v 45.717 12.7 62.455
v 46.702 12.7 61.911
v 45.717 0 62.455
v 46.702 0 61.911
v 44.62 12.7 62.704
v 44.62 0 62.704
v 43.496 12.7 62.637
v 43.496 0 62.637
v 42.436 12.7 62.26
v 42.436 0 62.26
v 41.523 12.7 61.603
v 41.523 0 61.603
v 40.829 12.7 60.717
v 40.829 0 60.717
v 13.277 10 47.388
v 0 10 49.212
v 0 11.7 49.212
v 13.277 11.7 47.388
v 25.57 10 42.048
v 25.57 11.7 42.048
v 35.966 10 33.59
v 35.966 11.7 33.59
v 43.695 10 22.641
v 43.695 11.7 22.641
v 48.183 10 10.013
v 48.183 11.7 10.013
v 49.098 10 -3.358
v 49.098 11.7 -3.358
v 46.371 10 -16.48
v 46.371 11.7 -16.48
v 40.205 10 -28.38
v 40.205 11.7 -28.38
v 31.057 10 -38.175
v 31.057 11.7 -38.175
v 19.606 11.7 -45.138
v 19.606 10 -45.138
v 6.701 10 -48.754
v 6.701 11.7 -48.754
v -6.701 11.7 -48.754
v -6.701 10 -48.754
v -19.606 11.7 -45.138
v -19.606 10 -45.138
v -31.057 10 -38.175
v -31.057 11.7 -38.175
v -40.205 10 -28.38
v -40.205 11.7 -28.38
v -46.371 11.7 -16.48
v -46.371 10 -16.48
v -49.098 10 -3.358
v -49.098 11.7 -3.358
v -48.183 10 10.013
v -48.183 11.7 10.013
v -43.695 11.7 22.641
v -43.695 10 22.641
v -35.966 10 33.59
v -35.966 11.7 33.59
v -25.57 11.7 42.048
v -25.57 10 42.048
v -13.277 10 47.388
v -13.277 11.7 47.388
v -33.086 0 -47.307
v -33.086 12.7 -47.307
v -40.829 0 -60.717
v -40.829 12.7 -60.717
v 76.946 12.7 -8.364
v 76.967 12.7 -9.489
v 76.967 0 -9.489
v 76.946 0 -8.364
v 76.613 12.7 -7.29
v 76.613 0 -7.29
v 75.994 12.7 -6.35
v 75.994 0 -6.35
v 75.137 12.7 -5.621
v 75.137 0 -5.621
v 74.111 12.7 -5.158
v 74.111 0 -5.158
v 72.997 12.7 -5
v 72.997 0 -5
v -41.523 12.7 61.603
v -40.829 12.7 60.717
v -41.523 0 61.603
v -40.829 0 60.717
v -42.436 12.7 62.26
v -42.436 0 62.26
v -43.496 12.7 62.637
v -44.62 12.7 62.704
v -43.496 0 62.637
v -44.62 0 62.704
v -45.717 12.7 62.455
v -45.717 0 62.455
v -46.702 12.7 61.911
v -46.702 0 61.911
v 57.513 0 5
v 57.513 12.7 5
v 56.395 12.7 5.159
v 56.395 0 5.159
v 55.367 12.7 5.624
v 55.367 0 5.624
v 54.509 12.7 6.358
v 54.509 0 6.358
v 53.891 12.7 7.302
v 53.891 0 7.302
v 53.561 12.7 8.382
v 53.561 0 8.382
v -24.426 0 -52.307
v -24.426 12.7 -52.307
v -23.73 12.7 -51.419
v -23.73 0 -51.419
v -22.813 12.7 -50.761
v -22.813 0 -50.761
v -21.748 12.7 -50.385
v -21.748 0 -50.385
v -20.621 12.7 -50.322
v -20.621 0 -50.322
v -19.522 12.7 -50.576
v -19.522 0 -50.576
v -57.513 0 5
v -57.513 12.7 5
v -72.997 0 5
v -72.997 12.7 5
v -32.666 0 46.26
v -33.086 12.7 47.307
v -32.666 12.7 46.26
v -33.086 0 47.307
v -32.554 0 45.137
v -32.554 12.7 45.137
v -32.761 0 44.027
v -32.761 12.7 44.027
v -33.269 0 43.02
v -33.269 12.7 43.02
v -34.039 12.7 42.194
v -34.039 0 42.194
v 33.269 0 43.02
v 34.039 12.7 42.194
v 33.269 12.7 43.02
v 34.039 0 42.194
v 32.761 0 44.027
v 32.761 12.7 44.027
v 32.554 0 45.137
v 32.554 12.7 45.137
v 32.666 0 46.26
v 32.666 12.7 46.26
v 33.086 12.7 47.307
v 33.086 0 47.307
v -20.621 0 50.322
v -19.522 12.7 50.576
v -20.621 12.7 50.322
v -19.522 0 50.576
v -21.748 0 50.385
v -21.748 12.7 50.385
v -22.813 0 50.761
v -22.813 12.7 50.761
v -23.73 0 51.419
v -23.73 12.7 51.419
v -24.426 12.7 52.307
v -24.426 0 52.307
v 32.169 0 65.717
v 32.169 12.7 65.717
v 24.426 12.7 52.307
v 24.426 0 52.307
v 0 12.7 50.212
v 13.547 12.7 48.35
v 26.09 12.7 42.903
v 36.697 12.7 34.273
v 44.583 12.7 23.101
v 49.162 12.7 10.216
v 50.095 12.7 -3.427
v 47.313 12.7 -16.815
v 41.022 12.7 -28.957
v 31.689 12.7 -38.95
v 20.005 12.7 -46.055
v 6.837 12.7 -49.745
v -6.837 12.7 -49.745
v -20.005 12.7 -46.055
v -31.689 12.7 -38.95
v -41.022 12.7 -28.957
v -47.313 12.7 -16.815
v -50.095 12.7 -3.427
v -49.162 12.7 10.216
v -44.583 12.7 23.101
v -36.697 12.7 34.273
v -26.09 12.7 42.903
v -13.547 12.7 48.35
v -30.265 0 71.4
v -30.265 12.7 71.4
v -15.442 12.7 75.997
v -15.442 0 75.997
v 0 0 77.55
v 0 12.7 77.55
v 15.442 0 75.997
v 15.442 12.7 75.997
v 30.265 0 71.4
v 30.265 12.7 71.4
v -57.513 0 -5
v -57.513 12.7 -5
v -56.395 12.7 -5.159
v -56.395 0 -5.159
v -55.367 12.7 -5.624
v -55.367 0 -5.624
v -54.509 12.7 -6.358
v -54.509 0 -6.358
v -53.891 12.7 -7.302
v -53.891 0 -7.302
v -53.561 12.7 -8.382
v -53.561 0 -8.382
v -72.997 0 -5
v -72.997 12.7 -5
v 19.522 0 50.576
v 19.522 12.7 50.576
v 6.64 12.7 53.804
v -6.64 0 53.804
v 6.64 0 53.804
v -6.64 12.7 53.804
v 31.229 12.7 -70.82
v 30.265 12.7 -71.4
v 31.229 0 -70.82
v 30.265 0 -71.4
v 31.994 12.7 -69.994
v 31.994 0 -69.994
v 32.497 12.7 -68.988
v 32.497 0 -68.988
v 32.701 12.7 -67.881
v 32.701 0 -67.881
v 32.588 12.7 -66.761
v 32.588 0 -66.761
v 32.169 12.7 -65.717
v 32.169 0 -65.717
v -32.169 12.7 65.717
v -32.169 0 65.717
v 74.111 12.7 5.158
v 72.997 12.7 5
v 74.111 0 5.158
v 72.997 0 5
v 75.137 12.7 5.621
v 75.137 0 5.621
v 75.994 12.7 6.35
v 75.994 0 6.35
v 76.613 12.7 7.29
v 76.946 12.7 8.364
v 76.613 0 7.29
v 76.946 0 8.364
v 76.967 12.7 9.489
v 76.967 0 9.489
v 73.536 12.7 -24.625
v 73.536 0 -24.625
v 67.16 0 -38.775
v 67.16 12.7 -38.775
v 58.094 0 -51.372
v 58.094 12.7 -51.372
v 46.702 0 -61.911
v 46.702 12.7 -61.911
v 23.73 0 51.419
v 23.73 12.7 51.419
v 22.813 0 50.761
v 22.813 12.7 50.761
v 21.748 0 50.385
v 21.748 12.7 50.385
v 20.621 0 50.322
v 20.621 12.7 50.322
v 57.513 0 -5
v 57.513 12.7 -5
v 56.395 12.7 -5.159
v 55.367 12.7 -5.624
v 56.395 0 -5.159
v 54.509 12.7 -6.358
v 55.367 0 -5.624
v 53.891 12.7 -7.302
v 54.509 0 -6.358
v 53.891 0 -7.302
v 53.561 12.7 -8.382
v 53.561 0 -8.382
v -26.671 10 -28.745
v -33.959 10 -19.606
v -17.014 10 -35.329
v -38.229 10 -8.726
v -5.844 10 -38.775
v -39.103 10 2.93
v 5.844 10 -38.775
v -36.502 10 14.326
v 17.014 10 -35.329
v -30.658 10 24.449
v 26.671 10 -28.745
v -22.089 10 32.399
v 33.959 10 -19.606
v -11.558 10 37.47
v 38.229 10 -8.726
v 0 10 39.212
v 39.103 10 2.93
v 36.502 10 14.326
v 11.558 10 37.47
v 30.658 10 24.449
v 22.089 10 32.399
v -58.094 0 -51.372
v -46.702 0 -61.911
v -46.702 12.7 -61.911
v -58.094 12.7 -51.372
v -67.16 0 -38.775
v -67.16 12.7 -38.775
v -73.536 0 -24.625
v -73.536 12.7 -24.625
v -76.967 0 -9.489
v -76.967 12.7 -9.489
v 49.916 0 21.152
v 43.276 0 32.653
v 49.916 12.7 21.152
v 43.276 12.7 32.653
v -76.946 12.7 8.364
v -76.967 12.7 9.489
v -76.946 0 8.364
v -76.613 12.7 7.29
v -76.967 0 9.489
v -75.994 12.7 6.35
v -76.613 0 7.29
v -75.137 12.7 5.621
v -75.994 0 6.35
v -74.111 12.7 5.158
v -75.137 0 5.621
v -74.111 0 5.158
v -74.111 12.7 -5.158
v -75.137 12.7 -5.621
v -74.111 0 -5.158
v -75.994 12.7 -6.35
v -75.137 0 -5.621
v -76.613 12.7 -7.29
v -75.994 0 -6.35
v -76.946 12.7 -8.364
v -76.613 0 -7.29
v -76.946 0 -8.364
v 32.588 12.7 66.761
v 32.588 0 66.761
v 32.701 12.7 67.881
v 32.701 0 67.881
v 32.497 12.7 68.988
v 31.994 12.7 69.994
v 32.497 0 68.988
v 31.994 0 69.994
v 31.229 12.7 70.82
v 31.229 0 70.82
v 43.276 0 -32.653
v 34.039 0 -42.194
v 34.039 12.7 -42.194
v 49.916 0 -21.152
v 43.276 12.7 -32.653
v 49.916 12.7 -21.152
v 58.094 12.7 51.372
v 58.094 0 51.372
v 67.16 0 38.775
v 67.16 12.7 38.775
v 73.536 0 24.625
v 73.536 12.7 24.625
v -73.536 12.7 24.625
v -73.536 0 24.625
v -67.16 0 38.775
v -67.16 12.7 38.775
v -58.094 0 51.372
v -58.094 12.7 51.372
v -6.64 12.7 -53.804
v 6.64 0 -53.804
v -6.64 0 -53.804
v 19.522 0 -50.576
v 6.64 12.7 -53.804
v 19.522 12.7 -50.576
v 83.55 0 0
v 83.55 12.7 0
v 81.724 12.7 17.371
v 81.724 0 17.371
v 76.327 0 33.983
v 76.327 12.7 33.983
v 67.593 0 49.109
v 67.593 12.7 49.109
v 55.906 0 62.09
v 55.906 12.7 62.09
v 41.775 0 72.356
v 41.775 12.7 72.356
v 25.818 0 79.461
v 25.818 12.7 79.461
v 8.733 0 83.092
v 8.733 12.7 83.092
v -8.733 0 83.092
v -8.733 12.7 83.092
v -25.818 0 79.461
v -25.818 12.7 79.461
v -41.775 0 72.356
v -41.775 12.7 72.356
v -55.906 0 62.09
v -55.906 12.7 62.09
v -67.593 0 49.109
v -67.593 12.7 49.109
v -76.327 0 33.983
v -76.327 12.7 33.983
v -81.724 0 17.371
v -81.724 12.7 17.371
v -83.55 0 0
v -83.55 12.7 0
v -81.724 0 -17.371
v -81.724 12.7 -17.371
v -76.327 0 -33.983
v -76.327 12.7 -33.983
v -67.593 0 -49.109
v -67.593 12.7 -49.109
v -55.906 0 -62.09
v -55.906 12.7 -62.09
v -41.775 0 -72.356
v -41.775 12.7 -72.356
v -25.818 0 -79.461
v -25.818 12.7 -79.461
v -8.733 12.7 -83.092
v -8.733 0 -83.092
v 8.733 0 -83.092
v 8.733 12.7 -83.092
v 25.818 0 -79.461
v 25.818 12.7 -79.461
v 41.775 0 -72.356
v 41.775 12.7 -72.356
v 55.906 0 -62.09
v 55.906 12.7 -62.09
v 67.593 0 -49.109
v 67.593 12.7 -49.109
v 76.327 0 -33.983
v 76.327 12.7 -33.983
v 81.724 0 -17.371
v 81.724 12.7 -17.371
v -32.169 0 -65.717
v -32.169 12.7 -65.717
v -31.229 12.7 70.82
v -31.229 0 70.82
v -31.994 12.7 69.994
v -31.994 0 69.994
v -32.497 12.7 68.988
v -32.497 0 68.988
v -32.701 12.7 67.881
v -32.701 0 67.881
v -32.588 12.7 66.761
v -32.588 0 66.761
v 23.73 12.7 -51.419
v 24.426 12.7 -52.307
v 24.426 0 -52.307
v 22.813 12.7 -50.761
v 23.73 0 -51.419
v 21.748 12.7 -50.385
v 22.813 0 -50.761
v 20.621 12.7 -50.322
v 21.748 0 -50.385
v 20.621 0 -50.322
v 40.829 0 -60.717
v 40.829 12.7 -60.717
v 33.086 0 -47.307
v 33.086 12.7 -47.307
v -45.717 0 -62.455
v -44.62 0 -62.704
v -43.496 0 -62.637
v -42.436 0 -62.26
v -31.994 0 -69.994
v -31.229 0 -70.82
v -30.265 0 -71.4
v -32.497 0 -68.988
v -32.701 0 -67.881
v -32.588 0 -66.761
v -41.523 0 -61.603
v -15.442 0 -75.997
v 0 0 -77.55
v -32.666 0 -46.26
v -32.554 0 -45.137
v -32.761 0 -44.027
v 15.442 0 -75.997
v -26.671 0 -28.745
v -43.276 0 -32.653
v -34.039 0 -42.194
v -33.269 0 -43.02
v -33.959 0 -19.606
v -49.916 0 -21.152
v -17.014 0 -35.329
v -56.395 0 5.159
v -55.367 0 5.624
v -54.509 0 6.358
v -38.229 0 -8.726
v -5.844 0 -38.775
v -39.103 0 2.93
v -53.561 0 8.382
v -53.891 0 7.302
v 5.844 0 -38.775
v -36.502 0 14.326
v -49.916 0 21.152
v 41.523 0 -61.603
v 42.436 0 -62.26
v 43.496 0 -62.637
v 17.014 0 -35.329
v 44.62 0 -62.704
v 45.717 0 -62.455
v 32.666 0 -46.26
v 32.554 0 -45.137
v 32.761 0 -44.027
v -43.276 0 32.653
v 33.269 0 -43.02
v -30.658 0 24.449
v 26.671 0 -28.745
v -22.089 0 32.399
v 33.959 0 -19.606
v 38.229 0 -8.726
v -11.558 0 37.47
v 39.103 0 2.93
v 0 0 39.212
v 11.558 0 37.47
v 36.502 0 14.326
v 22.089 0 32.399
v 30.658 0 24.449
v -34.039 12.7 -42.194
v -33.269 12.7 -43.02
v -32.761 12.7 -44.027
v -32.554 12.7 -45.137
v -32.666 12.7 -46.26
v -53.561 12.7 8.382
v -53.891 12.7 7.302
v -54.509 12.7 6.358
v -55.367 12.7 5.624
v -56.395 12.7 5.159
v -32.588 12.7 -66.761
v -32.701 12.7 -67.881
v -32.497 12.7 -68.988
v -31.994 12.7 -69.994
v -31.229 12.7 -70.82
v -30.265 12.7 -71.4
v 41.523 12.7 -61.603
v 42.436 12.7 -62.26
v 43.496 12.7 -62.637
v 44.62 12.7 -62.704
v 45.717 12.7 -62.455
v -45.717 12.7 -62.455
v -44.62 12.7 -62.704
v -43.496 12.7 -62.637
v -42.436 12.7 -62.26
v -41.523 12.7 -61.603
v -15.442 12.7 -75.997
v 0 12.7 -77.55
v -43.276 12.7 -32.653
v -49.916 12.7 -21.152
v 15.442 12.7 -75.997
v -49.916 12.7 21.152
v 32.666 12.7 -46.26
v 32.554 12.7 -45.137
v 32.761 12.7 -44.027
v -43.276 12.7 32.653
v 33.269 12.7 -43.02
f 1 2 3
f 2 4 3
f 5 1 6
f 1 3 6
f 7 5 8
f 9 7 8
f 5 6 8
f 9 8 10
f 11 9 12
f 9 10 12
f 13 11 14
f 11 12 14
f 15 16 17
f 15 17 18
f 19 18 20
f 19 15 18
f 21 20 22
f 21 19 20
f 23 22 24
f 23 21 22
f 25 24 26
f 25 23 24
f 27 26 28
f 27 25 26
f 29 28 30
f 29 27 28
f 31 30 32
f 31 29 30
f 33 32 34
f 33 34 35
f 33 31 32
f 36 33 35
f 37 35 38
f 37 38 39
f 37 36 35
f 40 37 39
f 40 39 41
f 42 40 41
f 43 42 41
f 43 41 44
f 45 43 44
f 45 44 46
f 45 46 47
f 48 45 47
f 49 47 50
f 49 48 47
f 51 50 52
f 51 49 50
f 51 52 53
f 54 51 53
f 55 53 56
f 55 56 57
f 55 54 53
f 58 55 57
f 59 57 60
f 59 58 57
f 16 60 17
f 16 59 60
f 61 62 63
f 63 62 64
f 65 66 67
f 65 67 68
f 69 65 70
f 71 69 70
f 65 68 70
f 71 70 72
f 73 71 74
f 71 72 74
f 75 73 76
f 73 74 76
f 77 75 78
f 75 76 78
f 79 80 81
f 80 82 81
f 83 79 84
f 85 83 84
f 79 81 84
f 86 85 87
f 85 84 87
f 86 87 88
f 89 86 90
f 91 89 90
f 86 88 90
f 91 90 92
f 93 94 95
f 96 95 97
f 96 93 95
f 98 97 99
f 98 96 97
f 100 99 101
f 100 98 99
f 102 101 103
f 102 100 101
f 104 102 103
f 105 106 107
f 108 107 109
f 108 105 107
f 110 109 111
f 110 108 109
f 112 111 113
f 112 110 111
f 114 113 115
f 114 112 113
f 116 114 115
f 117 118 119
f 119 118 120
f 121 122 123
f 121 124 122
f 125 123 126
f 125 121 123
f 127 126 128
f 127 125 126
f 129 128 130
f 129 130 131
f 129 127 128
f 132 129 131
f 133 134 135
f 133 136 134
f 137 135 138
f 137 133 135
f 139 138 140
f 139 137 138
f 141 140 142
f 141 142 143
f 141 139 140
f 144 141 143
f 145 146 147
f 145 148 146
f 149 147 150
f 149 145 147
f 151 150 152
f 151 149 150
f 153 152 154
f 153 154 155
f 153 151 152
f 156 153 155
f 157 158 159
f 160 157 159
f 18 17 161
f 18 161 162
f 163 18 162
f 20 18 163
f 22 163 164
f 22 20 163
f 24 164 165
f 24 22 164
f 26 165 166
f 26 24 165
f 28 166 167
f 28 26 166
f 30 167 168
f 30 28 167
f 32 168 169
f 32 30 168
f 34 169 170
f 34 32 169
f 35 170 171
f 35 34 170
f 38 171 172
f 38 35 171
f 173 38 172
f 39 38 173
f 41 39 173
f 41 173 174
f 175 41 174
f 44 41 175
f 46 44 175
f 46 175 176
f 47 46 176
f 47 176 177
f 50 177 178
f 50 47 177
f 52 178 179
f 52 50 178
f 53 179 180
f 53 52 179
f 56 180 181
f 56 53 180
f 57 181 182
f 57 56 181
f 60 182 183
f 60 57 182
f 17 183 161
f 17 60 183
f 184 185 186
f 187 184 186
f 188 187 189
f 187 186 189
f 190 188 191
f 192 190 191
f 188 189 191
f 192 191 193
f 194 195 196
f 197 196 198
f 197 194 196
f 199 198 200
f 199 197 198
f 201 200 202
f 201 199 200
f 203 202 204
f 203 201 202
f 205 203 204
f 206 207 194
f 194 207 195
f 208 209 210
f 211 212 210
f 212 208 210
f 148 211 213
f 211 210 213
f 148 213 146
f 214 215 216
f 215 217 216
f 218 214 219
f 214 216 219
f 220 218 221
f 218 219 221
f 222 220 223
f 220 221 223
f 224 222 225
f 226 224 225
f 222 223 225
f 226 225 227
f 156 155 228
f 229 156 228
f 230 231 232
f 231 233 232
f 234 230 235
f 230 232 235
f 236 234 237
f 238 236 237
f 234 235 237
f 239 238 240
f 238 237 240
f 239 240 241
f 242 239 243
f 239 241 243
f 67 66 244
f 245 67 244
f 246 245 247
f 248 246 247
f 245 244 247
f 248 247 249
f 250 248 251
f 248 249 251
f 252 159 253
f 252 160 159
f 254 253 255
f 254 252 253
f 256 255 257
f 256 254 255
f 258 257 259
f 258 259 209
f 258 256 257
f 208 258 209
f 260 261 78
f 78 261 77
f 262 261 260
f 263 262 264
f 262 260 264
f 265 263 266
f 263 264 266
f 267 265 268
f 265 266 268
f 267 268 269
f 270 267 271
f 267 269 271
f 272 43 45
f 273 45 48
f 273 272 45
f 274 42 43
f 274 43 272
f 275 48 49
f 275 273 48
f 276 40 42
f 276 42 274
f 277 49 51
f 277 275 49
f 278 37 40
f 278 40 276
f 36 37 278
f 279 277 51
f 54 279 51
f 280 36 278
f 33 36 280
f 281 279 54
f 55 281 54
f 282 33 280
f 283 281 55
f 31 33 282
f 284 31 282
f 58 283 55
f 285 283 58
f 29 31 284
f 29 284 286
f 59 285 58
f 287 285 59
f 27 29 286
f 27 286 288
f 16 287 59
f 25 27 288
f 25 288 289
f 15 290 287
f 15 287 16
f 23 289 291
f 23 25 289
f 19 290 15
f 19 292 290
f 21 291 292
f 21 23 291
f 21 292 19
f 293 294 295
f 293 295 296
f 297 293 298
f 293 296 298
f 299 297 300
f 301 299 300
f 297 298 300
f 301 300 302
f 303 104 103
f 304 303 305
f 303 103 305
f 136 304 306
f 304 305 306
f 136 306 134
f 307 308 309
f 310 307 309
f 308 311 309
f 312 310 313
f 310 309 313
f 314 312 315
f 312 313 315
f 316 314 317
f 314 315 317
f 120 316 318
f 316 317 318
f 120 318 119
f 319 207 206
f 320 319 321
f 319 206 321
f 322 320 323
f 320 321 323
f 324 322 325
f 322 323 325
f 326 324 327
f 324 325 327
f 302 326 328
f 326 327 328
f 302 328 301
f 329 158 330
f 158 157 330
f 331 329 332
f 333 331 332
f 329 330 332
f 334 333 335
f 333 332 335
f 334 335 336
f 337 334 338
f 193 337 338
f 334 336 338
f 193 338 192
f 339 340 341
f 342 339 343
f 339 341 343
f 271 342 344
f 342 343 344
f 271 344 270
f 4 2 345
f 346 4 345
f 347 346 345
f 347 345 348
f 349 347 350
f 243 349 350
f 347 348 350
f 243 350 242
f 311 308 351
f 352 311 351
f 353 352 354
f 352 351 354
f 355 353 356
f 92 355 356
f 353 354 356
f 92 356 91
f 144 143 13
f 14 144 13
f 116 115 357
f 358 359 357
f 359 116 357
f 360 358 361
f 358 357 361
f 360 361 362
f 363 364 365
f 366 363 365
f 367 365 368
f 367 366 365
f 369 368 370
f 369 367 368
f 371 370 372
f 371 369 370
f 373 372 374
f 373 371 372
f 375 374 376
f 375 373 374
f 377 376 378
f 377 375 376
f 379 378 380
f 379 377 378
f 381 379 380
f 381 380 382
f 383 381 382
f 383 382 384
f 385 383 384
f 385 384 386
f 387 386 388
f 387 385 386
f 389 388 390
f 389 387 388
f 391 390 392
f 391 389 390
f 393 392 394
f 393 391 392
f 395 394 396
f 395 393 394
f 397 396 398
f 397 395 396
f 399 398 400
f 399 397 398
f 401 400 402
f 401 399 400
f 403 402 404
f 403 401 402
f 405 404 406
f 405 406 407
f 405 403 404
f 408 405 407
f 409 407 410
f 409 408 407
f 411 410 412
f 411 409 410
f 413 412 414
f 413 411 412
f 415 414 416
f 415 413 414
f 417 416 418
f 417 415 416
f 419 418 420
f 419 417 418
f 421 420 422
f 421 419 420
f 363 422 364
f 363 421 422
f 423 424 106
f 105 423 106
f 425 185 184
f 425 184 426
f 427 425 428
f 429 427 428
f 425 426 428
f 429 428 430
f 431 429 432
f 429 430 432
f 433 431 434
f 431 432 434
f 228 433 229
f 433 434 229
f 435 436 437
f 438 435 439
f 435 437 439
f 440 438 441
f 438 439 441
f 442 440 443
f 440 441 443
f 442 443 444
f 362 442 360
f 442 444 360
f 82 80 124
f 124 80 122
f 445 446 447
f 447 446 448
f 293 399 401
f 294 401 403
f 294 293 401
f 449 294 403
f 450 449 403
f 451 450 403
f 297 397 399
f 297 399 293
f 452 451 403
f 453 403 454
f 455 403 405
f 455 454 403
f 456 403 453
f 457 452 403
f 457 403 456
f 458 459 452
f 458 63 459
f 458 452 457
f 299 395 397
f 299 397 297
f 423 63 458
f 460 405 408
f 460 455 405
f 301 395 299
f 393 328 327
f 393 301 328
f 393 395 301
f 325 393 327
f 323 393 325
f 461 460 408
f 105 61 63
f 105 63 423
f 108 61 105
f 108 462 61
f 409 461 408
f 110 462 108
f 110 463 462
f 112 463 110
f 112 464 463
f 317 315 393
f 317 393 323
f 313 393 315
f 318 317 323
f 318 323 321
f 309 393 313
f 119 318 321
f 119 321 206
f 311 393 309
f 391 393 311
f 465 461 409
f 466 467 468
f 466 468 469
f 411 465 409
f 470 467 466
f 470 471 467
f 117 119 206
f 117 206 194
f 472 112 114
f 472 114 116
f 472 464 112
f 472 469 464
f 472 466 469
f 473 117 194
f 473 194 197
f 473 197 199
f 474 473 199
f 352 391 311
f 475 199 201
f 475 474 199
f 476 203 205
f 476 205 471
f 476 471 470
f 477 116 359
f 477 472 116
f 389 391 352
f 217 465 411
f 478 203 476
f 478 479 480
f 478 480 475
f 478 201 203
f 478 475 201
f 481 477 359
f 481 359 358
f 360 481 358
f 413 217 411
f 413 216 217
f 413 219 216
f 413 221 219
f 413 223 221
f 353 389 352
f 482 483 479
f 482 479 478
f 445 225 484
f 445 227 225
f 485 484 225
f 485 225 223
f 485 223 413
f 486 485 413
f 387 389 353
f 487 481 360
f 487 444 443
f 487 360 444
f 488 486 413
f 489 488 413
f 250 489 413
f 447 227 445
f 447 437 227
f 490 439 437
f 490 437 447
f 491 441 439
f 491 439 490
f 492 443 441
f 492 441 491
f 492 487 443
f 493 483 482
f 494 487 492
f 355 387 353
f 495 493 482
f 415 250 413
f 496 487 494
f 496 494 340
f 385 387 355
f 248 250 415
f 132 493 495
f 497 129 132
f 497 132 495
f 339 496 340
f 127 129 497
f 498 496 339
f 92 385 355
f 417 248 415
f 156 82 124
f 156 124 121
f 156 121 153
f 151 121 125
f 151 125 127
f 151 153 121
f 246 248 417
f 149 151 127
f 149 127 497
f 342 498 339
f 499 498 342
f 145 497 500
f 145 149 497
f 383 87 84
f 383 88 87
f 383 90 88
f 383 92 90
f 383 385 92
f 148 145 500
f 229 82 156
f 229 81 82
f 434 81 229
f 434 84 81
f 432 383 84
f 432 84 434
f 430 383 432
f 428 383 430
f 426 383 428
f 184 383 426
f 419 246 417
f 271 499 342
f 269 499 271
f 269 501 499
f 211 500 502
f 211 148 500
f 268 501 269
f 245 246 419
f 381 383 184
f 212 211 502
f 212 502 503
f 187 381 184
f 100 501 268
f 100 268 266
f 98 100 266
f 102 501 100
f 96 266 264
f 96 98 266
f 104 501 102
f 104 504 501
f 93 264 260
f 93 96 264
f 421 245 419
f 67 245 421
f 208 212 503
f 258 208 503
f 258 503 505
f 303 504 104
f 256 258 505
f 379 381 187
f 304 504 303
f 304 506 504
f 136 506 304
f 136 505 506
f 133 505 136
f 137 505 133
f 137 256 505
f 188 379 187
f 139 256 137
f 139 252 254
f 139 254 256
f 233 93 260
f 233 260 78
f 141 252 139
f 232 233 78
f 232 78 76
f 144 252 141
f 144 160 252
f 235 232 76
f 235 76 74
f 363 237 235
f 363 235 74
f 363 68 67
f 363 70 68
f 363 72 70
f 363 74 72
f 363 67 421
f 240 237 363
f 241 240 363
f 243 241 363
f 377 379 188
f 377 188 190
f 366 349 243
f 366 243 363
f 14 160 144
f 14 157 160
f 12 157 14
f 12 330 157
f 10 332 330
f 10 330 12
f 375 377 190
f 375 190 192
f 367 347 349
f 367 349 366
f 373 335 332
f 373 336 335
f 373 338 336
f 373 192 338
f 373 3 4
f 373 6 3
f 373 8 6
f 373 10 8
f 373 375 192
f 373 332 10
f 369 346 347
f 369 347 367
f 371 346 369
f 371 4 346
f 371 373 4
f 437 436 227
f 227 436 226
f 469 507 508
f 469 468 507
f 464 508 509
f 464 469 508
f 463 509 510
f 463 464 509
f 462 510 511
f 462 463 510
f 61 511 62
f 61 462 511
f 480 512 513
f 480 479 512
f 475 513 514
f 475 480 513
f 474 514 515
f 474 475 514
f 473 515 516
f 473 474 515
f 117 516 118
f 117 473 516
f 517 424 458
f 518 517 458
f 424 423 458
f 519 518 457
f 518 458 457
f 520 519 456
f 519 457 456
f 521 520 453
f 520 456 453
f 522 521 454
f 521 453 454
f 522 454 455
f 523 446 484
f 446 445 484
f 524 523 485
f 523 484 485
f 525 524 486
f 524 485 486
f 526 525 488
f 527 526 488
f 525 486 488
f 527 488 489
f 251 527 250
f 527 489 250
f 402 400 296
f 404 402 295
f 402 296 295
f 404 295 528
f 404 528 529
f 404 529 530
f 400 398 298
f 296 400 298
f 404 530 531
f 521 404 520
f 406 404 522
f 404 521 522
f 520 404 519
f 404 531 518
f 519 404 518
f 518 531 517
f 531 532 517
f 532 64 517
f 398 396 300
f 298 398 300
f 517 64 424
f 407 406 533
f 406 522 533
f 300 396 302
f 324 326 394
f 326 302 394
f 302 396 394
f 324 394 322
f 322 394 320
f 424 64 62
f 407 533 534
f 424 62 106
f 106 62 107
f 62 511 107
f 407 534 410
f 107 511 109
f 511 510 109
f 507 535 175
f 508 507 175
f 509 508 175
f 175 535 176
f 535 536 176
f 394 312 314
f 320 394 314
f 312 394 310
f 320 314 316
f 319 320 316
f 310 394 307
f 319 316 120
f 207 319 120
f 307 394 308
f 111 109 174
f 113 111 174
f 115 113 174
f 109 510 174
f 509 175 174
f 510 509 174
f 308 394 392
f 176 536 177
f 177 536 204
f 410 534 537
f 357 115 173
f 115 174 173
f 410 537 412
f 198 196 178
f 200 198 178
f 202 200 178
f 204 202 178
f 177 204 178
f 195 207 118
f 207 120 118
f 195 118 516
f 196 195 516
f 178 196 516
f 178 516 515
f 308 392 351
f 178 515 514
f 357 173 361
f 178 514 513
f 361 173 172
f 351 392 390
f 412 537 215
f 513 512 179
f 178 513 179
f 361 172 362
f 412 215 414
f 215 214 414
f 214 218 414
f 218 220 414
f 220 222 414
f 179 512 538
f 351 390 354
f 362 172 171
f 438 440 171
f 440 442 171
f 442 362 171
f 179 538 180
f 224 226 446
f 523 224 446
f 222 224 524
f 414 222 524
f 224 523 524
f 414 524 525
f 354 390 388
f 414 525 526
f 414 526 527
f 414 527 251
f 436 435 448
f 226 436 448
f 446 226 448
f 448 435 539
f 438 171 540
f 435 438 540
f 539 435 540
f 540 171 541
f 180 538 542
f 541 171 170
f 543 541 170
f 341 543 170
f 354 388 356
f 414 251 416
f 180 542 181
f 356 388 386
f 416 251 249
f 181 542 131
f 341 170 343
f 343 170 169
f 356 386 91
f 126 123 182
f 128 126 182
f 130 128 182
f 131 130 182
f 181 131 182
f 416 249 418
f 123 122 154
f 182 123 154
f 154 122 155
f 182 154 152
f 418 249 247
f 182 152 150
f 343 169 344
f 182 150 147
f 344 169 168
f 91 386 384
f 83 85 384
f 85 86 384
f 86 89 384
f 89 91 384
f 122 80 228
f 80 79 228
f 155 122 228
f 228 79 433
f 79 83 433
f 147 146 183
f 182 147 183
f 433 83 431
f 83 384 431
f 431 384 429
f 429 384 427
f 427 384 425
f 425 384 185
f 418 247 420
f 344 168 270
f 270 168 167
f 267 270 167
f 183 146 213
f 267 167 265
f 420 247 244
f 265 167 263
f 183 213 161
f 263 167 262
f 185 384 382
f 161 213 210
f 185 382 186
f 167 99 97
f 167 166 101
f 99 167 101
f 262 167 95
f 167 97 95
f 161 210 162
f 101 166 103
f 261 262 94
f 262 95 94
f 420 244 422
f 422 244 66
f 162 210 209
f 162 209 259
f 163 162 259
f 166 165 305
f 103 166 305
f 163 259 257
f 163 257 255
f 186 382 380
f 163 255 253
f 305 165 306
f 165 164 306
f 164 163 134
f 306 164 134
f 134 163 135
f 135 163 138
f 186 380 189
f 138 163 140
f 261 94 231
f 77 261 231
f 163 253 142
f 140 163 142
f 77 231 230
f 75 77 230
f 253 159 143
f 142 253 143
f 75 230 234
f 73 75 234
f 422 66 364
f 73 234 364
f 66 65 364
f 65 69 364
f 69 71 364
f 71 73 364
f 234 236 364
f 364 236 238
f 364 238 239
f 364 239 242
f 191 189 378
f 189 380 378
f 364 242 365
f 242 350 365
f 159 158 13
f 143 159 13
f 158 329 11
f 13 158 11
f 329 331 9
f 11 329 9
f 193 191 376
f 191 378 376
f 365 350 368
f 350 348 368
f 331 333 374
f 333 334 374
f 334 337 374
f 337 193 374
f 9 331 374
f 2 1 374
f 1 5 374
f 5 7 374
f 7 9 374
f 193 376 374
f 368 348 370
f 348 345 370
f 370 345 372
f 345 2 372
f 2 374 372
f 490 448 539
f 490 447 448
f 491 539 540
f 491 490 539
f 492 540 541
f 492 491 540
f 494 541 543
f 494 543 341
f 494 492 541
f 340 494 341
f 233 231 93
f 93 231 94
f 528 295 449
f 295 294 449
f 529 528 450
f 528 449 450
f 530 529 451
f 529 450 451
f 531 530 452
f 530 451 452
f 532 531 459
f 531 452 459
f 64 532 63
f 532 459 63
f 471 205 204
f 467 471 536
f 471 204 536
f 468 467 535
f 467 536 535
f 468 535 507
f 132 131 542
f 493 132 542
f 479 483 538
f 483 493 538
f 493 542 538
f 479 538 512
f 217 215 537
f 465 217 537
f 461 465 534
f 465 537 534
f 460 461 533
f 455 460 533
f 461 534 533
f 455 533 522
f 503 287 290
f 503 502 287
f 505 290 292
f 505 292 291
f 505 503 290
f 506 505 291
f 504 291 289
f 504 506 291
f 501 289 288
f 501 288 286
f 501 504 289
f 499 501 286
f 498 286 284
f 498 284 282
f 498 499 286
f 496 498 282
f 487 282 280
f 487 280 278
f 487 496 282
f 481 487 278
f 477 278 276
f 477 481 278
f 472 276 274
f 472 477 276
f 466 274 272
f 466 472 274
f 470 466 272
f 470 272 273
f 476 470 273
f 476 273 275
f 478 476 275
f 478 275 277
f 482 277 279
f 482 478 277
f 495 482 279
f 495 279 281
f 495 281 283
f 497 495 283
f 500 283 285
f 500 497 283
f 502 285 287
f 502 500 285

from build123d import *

# Parameters (mm, degrees)
CUT_EXTRUDE1_DEPTH       = 13.7
FILLET1_R                = 4
CIRPATTERN4_COUNT        = 6
FILLET1_OF_CIRPATTERN4_R = 4
CHAMFER1_SIZE            = 1
SKETCH9_R                = 83.55
SKETCH9_R_2              = 82.55
BOSS_EXTRUDE1_DEPTH      = 12.7


with BuildPart() as part:
    # Sketch2 → Revolve1 (revolve)
    with BuildSketch(Plane(origin=(0, 0, 0), x_dir=(0, 0, -1), z_dir=(1, 0, 0))):
        Polygon((-39.2125, 0), (-82.55, 0), (-82.55, 12.7), (-49.2125, 12.7), (-49.2125, 10), (-39.2125, 10), align=None)
    revolve(axis=Axis((0, -0.9525, 0), (0, 1, 0)))

    # Sketch8 → Cut-Extrude1 (cut, through all)
    with BuildSketch(Plane(origin=(0, 12.7, 0), x_dir=(1, 0, 0), z_dir=(0, 1, 0))):
        with BuildLine():
            Line((-34.364196, 69.520533), (-22.66059, 49.249293))
            ThreePointArc((-22.66059, 49.249293), (0, 54.2125), (22.66059, 49.249293))
            Line((22.66059, 49.249293), (34.364196, 69.520533))
            ThreePointArc((34.364196, 69.520533), (0, 77.55), (-34.364196, 69.520533))
        make_face()
    cut_extrude1 = extrude(amount=-CUT_EXTRUDE1_DEPTH, mode=Mode.SUBTRACT)

    # Fillet1
    fillet1_edges = [part.edges().sort_by_distance(p)[0] for p in [
        (22.66059, 6.35, -49.249293),
        (-22.66059, 6.35, -49.249293),
        (-34.364196, 6.35, -69.520533),
        (34.364196, 6.35, -69.520533),
    ]]
    fillet(fillet1_edges, radius=FILLET1_R)

    # CirPattern4: Cut-Extrude1 ×6 about axis
    cirpattern4_axis = Axis((0, 0, 0), (0, 1, 0))
    for i in range(1, CIRPATTERN4_COUNT):
        add(cut_extrude1.rotate(cirpattern4_axis, i * 360 / CIRPATTERN4_COUNT), mode=Mode.SUBTRACT)

    # Fillet1 of CirPattern4
    fillet1_of_cirpattern4_edges = [part.edges().sort_by_distance(p)[0] for p in [
        (-31.320844, 6.35, -44.249293),
        (-53.981433, 6.35, -5),
        (-77.388646, 6.35, -5),
        (-43.02445, 6.35, -64.520533),
        (-53.981433, 6.35, 5),
        (-31.320844, 6.35, 44.249293),
        (-43.02445, 6.35, 64.520533),
        (-77.388646, 6.35, 5),
        (-22.66059, 6.35, 49.249293),
        (22.66059, 6.35, 49.249293),
        (34.364196, 6.35, 69.520533),
        (-34.364196, 6.35, 69.520533),
        (31.320844, 6.35, 44.249293),
        (53.981433, 6.35, 5),
        (77.388646, 6.35, 5),
        (43.02445, 6.35, 64.520533),
        (53.981433, 6.35, -5),
        (31.320844, 6.35, -44.249293),
        (43.02445, 6.35, -64.520533),
        (77.388646, 6.35, -5),
    ]]
    fillet(fillet1_of_cirpattern4_edges, radius=FILLET1_OF_CIRPATTERN4_R)

    # Chamfer1
    chamfer1_edges = [part.edges().sort_by_distance(p)[0] for p in [
        (0, 12.7, -49.2125),
    ]]
    chamfer(chamfer1_edges, length=CHAMFER1_SIZE)

    # Sketch9 → Boss-Extrude1 (add)
    with BuildSketch(Plane.XZ):
        Circle(SKETCH9_R)
        Circle(SKETCH9_R_2, mode=Mode.SUBTRACT)
    extrude(amount=-BOSS_EXTRUDE1_DEPTH)


solid = part.part
